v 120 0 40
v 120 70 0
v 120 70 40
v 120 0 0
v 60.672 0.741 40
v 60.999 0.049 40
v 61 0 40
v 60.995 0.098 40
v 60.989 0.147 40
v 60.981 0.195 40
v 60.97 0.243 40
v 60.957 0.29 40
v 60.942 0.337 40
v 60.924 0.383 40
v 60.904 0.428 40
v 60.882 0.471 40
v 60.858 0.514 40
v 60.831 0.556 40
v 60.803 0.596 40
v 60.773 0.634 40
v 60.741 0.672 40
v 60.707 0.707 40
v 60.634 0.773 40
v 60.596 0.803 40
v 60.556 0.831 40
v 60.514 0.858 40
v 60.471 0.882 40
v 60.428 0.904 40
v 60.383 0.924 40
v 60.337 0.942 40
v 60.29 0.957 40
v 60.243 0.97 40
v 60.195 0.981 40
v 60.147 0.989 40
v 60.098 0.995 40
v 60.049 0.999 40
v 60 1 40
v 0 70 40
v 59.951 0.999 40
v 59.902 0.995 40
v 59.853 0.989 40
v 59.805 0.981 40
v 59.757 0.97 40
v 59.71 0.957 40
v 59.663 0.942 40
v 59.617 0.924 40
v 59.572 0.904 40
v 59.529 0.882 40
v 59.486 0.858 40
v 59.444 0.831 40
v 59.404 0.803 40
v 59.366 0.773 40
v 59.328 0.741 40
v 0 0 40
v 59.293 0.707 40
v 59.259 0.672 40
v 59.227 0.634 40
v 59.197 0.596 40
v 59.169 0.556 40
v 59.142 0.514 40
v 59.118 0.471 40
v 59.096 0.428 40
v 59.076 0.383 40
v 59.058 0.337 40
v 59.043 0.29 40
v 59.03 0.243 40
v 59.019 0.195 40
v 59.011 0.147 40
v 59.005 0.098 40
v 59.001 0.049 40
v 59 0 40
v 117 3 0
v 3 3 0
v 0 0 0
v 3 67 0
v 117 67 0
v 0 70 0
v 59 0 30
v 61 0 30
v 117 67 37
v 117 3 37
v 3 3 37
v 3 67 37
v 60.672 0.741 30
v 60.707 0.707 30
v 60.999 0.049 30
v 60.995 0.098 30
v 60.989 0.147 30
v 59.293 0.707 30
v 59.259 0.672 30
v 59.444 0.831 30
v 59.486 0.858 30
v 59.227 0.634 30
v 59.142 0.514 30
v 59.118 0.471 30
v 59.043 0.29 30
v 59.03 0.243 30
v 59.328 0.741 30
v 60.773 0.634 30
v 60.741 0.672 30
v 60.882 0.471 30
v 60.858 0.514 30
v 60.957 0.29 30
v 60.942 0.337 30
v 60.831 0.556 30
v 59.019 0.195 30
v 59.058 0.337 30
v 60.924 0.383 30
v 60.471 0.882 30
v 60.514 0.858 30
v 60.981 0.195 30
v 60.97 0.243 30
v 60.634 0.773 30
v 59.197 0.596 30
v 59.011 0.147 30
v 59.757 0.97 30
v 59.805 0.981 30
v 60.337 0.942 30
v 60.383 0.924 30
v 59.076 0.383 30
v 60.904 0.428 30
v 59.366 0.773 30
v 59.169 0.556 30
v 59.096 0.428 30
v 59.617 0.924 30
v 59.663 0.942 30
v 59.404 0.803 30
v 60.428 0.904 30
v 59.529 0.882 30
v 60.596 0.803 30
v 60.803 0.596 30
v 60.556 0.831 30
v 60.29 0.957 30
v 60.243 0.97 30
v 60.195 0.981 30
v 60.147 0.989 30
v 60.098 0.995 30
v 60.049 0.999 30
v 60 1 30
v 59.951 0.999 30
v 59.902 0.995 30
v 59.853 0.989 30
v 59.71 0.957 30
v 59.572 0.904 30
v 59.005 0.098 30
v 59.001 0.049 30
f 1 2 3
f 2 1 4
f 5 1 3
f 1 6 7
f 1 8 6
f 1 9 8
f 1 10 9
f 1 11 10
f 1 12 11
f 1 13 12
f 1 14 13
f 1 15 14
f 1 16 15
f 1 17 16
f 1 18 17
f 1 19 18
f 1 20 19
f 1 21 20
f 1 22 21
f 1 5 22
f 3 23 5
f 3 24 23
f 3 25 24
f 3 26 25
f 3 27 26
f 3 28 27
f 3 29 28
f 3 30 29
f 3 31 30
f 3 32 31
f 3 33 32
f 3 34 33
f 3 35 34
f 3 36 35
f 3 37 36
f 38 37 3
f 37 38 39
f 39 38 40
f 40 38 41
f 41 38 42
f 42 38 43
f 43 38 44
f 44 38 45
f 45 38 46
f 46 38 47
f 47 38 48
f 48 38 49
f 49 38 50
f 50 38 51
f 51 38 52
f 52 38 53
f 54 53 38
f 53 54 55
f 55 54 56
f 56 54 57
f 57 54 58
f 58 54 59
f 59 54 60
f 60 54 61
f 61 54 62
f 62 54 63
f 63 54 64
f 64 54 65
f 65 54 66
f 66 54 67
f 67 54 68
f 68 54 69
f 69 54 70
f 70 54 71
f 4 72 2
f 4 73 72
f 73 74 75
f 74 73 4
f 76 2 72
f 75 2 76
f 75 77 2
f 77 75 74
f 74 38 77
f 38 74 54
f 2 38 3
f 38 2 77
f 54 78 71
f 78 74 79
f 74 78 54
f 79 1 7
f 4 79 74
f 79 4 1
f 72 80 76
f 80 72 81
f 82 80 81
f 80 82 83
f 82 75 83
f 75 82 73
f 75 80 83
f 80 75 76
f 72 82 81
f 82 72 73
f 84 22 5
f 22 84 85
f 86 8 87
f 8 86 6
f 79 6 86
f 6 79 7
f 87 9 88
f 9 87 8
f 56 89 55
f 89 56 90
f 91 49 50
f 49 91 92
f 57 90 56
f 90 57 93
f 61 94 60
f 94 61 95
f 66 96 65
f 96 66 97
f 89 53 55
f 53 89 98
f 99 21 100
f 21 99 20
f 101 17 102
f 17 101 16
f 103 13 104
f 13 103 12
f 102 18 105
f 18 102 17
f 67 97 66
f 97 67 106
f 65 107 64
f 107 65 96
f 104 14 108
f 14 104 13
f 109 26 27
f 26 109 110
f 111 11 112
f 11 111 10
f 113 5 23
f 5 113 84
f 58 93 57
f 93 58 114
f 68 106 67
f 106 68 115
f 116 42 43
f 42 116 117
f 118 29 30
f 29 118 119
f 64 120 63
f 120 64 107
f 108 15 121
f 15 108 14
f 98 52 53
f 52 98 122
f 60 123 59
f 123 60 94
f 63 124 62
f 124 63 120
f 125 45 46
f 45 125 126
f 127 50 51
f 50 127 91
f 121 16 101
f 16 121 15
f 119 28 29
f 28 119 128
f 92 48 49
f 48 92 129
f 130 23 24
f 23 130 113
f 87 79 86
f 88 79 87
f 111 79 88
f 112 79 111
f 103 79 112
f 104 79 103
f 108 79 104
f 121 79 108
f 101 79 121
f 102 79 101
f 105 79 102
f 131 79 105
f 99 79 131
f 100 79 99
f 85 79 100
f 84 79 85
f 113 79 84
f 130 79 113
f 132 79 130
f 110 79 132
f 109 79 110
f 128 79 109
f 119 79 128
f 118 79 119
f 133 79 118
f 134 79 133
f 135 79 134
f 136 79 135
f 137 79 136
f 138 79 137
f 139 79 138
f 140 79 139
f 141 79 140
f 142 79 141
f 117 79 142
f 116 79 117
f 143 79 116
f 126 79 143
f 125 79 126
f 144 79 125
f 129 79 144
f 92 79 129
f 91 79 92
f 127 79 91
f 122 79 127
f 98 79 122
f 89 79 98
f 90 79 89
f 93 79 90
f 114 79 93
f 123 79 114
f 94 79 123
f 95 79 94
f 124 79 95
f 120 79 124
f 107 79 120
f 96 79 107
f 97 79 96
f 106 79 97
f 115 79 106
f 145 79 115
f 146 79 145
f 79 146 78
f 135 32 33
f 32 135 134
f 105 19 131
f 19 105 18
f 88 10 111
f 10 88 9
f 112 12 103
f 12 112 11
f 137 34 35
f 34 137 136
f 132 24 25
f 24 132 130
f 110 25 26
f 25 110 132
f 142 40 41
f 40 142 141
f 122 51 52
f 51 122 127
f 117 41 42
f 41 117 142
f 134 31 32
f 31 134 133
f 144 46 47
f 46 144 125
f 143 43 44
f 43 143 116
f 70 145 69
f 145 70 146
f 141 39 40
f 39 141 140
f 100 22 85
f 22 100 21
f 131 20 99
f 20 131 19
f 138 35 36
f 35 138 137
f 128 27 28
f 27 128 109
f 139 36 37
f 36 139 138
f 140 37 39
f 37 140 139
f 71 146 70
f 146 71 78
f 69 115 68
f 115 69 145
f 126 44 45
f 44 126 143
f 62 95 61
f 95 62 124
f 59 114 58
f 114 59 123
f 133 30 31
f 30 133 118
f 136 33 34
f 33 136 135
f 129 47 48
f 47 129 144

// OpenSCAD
// Buffer Tank for Mini Horizontal Gel Electrophoresis
// Units: millimetres

// Outer Dimensions
$outer_x = 120;
$outer_y = 70;
$outer_z = 40;

// Wall and Floor Thickness
$wall_thick = 3;
$floor_thick = 3;

// Platform Dimensions
$platform_x = 60;
$platform_y = $outer_y; // Spans full inner width
$platform_height = 10;  // Height above inner floor
$platform_z_top = $outer_z - $wall_thick - $floor_thick + $platform_height; // 40 - 3 - 3 + 10 = 44

// Hole Dimensions
$hole_diameter = 2;
$hole_y = 0;
$hole_z = 30;

// Configuration
$fn = 128; // High resolution for smooth curves and accurate hole sizing

// Derived Dimensions
$inner_x = $outer_x - 2 * $wall_thick; // 114
$inner_y = $outer_y - 2 * $wall_thick; // 64
$inner_z = $outer_z - $wall_thick;     // 37 (Top of floor/walls)

// Calculate Platform Z position relative to tank bottom (z=0)
// Tank bottom is at z=0. Inner floor top is at z=$floor_thick.
// Platform top is at z = $floor_thick + $platform_height = 3 + 10 = 13.
$platform_z_top = $floor_thick + $platform_height;

// Start building the tank
difference() {
    // 1. Create the main outer block
    cube([
        $outer_x, 
        $outer_y, 
        $outer_z
    ]);

    // 2. Cut out the inner volume (walls and floor)
    // We subtract a block that is the size of the inner cavity
    translate([
        $wall_thick, 
        $wall_thick, 
        0
    ]) {
        cube([
            $inner_x, 
            $inner_y, 
            $inner_z
        ]);
    }

    // 3. Cut out the platform from the bottom chamber
    // The platform sits on the floor (z=0) and goes up to $platform_z_top
    // It spans the full width ($inner_y) and is centered in X
    translate([
        ($outer_x - $platform_x) / 2, 
        $wall_thick, // Start from inner wall
        0
    ]) {
        cube([
            $platform_x, 
            $inner_y, 
            $platform_z_top
        ]);
    }

    // 4. Drill holes for electrodes
    // Position: y = 0 (center of tank width), z = 30
    // The hole goes through the wall along the X axis.
    // We need to drill from the outside face (x = $outer_x/2) to the inside.
    // Since we are in a difference block, we place cylinders at the hole location.
    
    // Left Hole (at x = -outer_x/2)
    translate([
        -$outer_x / 2, 
        $hole_y, 
        $hole_z
    ]) {
        cylinder(
            h = $outer_x, // Long enough to go through the whole tank
            r = $hole_diameter / 2,
            $fn = $fn
        );
    }

    // Right Hole (at x = +outer_x/2)
    translate([
        $outer_x / 2, 
        $hole_y, 
        $hole_z
    ]) {
        cylinder(
            h = $outer_x,
            r = $hole_diameter / 2,
            $fn = $fn
        );
    }
}
